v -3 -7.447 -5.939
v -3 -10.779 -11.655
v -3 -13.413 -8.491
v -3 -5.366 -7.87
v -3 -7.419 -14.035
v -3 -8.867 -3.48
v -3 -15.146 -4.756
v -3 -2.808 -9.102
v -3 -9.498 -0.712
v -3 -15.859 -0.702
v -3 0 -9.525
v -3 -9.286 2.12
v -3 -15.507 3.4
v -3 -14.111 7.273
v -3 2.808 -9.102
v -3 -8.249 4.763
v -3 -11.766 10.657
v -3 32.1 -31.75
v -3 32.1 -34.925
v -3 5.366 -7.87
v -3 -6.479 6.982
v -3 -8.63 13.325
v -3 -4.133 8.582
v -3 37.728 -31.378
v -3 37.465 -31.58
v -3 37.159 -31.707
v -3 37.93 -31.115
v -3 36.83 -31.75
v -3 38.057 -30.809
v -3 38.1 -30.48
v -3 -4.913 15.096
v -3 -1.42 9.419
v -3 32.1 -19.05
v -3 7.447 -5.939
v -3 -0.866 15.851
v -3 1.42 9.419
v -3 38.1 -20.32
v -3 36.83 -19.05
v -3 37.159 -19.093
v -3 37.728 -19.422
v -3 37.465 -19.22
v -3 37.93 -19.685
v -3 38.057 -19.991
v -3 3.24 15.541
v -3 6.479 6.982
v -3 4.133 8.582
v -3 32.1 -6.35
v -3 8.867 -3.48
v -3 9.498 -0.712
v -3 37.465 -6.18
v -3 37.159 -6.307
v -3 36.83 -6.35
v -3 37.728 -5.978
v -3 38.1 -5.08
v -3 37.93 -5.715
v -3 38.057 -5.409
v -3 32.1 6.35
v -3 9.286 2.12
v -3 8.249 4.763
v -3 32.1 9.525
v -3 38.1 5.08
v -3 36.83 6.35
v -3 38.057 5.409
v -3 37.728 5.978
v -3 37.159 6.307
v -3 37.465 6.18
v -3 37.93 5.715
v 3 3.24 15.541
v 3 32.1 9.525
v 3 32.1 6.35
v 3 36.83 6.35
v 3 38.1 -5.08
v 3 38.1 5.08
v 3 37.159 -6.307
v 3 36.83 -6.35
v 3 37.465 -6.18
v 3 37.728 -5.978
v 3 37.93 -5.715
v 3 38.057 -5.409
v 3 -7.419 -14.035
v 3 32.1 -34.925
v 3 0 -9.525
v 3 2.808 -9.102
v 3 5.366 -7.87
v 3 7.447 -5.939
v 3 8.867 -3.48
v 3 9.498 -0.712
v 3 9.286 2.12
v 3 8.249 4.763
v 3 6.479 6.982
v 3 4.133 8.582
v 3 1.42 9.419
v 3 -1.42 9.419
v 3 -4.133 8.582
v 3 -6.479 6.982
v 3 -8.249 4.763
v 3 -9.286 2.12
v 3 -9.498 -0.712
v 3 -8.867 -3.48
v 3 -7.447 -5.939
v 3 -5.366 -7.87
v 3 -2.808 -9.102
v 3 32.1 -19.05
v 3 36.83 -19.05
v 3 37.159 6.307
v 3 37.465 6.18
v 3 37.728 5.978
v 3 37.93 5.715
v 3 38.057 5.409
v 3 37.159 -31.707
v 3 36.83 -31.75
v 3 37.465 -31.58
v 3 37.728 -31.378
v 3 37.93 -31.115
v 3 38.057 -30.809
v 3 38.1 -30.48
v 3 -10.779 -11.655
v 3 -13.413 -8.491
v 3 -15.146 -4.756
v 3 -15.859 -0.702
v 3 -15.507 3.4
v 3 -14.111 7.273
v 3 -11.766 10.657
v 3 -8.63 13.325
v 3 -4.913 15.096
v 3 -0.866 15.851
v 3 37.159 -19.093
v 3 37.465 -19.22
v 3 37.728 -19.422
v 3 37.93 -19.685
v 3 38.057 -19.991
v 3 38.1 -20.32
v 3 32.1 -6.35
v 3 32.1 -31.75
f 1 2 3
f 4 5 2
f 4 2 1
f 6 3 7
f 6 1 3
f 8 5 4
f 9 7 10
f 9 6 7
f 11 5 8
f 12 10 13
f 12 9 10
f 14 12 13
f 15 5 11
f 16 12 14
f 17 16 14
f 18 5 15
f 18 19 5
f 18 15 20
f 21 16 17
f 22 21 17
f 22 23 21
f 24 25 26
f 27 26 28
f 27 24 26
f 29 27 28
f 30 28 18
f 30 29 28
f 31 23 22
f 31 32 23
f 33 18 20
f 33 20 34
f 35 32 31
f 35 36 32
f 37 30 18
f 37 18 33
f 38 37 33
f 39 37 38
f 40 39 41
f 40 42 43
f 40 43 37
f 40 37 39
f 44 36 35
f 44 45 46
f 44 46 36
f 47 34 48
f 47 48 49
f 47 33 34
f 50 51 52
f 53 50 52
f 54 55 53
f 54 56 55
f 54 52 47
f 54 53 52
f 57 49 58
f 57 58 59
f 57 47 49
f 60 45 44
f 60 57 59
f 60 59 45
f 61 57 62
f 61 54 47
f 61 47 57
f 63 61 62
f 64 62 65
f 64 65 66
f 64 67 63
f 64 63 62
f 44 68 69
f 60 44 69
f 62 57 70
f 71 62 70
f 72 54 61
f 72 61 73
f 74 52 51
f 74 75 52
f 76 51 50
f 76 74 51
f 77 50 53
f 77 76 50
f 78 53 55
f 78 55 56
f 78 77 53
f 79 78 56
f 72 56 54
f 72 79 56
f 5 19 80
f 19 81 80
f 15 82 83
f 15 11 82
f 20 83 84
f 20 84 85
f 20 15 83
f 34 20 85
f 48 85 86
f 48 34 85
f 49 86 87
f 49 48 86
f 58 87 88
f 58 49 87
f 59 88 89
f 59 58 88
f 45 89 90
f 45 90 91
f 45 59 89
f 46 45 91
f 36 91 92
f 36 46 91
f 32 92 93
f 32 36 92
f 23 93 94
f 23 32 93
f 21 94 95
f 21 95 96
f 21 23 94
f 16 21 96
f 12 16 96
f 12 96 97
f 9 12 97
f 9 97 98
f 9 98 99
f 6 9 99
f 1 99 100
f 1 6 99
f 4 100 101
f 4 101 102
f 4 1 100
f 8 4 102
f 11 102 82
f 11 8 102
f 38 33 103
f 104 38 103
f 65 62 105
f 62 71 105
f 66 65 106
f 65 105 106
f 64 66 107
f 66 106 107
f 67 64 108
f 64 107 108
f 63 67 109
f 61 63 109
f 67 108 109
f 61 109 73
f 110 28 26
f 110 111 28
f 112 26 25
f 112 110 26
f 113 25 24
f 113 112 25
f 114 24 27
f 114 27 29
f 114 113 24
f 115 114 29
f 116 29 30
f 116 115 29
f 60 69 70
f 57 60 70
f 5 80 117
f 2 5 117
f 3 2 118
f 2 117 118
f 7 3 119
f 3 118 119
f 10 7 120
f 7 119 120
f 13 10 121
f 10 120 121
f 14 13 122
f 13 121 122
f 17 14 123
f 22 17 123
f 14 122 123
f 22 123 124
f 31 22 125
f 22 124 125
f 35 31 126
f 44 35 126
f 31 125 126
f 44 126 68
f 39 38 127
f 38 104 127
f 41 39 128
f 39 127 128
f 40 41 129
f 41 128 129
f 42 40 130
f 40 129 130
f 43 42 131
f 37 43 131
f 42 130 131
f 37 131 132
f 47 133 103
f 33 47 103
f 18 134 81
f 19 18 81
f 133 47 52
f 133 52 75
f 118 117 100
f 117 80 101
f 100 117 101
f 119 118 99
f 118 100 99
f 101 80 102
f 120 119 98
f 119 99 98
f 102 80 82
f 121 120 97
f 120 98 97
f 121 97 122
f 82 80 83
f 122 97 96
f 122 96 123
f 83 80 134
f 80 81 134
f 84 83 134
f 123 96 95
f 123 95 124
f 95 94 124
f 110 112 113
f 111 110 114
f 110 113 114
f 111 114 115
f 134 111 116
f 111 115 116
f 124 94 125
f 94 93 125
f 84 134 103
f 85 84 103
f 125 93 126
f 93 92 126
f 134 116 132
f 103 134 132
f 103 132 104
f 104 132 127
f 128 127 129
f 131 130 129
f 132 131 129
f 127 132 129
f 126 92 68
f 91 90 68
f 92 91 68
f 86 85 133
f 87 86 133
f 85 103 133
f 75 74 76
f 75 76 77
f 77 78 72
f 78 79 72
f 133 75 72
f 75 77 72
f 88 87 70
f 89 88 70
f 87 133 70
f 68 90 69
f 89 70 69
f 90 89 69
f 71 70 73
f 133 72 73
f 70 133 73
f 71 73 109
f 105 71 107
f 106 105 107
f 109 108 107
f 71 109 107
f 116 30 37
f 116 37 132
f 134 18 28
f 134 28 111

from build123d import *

# Parameters (mm, degrees)
SKETCH1_R              = 9.525
BOSS_EXTRUDE1_DEPTH    = 3
SKETCH3_W              = 6
SKETCH3_H              = 12.7
BOSS_EXTRUDE2_DEPTH    = 6
FILLET1_R              = 1.27
LPATTERN1_COUNT        = 2
LPATTERN1_PITCH        = 25.4
FILLET1_OF_LPATTERN1_R = 1.27


with BuildPart() as part:
    # Sketch1 → Boss-Extrude1 (new, symmetric)
    with BuildSketch(Plane(origin=(0, 0, 0), x_dir=(0, 0, -1), z_dir=(1, 0, 0))):
        with BuildLine():
            Line((-15.540953853, 3.23950279), (-9.525, 32.1))
            Line((-9.525, 32.1), (34.925, 32.1))
            Line((34.925, 32.1), (14.034766421, -7.41895926))
            ThreePointArc((14.034766421, -7.41895926), (-5.382179248, -14.934783947), (-15.540953853, 3.23950279))
        make_face()
        Circle(SKETCH1_R, mode=Mode.SUBTRACT)
    extrude(amount=BOSS_EXTRUDE1_DEPTH, both=True)

    # Sketch3 → Boss-Extrude2 (add)
    with BuildSketch(Plane(origin=(0, 32.1, 0), x_dir=(1, 0, 0), z_dir=(0, 1, 0))):
        Rectangle(SKETCH3_W, SKETCH3_H)
    boss_extrude2 = extrude(amount=BOSS_EXTRUDE2_DEPTH)

    # Fillet1
    fillet1_edges = [part.edges().sort_by_distance(p)[0] for p in [
        (0, 38.1, -6.35),
        (0, 38.1, 6.35),
    ]]
    fillet(fillet1_edges, radius=FILLET1_R)

    # LPattern1: Boss-Extrude2 ×2
    with Locations(*[(0, 0, -i * LPATTERN1_PITCH) for i in range(1, LPATTERN1_COUNT)]):
        add(boss_extrude2)

    # Fillet1 of LPattern1
    fillet1_of_lpattern1_edges = [part.edges().sort_by_distance(p)[0] for p in [
        (0, 38.1, -31.75),
        (0, 38.1, -19.05),
    ]]
    fillet(fillet1_of_lpattern1_edges, radius=FILLET1_OF_LPATTERN1_R)


solid = part.part
